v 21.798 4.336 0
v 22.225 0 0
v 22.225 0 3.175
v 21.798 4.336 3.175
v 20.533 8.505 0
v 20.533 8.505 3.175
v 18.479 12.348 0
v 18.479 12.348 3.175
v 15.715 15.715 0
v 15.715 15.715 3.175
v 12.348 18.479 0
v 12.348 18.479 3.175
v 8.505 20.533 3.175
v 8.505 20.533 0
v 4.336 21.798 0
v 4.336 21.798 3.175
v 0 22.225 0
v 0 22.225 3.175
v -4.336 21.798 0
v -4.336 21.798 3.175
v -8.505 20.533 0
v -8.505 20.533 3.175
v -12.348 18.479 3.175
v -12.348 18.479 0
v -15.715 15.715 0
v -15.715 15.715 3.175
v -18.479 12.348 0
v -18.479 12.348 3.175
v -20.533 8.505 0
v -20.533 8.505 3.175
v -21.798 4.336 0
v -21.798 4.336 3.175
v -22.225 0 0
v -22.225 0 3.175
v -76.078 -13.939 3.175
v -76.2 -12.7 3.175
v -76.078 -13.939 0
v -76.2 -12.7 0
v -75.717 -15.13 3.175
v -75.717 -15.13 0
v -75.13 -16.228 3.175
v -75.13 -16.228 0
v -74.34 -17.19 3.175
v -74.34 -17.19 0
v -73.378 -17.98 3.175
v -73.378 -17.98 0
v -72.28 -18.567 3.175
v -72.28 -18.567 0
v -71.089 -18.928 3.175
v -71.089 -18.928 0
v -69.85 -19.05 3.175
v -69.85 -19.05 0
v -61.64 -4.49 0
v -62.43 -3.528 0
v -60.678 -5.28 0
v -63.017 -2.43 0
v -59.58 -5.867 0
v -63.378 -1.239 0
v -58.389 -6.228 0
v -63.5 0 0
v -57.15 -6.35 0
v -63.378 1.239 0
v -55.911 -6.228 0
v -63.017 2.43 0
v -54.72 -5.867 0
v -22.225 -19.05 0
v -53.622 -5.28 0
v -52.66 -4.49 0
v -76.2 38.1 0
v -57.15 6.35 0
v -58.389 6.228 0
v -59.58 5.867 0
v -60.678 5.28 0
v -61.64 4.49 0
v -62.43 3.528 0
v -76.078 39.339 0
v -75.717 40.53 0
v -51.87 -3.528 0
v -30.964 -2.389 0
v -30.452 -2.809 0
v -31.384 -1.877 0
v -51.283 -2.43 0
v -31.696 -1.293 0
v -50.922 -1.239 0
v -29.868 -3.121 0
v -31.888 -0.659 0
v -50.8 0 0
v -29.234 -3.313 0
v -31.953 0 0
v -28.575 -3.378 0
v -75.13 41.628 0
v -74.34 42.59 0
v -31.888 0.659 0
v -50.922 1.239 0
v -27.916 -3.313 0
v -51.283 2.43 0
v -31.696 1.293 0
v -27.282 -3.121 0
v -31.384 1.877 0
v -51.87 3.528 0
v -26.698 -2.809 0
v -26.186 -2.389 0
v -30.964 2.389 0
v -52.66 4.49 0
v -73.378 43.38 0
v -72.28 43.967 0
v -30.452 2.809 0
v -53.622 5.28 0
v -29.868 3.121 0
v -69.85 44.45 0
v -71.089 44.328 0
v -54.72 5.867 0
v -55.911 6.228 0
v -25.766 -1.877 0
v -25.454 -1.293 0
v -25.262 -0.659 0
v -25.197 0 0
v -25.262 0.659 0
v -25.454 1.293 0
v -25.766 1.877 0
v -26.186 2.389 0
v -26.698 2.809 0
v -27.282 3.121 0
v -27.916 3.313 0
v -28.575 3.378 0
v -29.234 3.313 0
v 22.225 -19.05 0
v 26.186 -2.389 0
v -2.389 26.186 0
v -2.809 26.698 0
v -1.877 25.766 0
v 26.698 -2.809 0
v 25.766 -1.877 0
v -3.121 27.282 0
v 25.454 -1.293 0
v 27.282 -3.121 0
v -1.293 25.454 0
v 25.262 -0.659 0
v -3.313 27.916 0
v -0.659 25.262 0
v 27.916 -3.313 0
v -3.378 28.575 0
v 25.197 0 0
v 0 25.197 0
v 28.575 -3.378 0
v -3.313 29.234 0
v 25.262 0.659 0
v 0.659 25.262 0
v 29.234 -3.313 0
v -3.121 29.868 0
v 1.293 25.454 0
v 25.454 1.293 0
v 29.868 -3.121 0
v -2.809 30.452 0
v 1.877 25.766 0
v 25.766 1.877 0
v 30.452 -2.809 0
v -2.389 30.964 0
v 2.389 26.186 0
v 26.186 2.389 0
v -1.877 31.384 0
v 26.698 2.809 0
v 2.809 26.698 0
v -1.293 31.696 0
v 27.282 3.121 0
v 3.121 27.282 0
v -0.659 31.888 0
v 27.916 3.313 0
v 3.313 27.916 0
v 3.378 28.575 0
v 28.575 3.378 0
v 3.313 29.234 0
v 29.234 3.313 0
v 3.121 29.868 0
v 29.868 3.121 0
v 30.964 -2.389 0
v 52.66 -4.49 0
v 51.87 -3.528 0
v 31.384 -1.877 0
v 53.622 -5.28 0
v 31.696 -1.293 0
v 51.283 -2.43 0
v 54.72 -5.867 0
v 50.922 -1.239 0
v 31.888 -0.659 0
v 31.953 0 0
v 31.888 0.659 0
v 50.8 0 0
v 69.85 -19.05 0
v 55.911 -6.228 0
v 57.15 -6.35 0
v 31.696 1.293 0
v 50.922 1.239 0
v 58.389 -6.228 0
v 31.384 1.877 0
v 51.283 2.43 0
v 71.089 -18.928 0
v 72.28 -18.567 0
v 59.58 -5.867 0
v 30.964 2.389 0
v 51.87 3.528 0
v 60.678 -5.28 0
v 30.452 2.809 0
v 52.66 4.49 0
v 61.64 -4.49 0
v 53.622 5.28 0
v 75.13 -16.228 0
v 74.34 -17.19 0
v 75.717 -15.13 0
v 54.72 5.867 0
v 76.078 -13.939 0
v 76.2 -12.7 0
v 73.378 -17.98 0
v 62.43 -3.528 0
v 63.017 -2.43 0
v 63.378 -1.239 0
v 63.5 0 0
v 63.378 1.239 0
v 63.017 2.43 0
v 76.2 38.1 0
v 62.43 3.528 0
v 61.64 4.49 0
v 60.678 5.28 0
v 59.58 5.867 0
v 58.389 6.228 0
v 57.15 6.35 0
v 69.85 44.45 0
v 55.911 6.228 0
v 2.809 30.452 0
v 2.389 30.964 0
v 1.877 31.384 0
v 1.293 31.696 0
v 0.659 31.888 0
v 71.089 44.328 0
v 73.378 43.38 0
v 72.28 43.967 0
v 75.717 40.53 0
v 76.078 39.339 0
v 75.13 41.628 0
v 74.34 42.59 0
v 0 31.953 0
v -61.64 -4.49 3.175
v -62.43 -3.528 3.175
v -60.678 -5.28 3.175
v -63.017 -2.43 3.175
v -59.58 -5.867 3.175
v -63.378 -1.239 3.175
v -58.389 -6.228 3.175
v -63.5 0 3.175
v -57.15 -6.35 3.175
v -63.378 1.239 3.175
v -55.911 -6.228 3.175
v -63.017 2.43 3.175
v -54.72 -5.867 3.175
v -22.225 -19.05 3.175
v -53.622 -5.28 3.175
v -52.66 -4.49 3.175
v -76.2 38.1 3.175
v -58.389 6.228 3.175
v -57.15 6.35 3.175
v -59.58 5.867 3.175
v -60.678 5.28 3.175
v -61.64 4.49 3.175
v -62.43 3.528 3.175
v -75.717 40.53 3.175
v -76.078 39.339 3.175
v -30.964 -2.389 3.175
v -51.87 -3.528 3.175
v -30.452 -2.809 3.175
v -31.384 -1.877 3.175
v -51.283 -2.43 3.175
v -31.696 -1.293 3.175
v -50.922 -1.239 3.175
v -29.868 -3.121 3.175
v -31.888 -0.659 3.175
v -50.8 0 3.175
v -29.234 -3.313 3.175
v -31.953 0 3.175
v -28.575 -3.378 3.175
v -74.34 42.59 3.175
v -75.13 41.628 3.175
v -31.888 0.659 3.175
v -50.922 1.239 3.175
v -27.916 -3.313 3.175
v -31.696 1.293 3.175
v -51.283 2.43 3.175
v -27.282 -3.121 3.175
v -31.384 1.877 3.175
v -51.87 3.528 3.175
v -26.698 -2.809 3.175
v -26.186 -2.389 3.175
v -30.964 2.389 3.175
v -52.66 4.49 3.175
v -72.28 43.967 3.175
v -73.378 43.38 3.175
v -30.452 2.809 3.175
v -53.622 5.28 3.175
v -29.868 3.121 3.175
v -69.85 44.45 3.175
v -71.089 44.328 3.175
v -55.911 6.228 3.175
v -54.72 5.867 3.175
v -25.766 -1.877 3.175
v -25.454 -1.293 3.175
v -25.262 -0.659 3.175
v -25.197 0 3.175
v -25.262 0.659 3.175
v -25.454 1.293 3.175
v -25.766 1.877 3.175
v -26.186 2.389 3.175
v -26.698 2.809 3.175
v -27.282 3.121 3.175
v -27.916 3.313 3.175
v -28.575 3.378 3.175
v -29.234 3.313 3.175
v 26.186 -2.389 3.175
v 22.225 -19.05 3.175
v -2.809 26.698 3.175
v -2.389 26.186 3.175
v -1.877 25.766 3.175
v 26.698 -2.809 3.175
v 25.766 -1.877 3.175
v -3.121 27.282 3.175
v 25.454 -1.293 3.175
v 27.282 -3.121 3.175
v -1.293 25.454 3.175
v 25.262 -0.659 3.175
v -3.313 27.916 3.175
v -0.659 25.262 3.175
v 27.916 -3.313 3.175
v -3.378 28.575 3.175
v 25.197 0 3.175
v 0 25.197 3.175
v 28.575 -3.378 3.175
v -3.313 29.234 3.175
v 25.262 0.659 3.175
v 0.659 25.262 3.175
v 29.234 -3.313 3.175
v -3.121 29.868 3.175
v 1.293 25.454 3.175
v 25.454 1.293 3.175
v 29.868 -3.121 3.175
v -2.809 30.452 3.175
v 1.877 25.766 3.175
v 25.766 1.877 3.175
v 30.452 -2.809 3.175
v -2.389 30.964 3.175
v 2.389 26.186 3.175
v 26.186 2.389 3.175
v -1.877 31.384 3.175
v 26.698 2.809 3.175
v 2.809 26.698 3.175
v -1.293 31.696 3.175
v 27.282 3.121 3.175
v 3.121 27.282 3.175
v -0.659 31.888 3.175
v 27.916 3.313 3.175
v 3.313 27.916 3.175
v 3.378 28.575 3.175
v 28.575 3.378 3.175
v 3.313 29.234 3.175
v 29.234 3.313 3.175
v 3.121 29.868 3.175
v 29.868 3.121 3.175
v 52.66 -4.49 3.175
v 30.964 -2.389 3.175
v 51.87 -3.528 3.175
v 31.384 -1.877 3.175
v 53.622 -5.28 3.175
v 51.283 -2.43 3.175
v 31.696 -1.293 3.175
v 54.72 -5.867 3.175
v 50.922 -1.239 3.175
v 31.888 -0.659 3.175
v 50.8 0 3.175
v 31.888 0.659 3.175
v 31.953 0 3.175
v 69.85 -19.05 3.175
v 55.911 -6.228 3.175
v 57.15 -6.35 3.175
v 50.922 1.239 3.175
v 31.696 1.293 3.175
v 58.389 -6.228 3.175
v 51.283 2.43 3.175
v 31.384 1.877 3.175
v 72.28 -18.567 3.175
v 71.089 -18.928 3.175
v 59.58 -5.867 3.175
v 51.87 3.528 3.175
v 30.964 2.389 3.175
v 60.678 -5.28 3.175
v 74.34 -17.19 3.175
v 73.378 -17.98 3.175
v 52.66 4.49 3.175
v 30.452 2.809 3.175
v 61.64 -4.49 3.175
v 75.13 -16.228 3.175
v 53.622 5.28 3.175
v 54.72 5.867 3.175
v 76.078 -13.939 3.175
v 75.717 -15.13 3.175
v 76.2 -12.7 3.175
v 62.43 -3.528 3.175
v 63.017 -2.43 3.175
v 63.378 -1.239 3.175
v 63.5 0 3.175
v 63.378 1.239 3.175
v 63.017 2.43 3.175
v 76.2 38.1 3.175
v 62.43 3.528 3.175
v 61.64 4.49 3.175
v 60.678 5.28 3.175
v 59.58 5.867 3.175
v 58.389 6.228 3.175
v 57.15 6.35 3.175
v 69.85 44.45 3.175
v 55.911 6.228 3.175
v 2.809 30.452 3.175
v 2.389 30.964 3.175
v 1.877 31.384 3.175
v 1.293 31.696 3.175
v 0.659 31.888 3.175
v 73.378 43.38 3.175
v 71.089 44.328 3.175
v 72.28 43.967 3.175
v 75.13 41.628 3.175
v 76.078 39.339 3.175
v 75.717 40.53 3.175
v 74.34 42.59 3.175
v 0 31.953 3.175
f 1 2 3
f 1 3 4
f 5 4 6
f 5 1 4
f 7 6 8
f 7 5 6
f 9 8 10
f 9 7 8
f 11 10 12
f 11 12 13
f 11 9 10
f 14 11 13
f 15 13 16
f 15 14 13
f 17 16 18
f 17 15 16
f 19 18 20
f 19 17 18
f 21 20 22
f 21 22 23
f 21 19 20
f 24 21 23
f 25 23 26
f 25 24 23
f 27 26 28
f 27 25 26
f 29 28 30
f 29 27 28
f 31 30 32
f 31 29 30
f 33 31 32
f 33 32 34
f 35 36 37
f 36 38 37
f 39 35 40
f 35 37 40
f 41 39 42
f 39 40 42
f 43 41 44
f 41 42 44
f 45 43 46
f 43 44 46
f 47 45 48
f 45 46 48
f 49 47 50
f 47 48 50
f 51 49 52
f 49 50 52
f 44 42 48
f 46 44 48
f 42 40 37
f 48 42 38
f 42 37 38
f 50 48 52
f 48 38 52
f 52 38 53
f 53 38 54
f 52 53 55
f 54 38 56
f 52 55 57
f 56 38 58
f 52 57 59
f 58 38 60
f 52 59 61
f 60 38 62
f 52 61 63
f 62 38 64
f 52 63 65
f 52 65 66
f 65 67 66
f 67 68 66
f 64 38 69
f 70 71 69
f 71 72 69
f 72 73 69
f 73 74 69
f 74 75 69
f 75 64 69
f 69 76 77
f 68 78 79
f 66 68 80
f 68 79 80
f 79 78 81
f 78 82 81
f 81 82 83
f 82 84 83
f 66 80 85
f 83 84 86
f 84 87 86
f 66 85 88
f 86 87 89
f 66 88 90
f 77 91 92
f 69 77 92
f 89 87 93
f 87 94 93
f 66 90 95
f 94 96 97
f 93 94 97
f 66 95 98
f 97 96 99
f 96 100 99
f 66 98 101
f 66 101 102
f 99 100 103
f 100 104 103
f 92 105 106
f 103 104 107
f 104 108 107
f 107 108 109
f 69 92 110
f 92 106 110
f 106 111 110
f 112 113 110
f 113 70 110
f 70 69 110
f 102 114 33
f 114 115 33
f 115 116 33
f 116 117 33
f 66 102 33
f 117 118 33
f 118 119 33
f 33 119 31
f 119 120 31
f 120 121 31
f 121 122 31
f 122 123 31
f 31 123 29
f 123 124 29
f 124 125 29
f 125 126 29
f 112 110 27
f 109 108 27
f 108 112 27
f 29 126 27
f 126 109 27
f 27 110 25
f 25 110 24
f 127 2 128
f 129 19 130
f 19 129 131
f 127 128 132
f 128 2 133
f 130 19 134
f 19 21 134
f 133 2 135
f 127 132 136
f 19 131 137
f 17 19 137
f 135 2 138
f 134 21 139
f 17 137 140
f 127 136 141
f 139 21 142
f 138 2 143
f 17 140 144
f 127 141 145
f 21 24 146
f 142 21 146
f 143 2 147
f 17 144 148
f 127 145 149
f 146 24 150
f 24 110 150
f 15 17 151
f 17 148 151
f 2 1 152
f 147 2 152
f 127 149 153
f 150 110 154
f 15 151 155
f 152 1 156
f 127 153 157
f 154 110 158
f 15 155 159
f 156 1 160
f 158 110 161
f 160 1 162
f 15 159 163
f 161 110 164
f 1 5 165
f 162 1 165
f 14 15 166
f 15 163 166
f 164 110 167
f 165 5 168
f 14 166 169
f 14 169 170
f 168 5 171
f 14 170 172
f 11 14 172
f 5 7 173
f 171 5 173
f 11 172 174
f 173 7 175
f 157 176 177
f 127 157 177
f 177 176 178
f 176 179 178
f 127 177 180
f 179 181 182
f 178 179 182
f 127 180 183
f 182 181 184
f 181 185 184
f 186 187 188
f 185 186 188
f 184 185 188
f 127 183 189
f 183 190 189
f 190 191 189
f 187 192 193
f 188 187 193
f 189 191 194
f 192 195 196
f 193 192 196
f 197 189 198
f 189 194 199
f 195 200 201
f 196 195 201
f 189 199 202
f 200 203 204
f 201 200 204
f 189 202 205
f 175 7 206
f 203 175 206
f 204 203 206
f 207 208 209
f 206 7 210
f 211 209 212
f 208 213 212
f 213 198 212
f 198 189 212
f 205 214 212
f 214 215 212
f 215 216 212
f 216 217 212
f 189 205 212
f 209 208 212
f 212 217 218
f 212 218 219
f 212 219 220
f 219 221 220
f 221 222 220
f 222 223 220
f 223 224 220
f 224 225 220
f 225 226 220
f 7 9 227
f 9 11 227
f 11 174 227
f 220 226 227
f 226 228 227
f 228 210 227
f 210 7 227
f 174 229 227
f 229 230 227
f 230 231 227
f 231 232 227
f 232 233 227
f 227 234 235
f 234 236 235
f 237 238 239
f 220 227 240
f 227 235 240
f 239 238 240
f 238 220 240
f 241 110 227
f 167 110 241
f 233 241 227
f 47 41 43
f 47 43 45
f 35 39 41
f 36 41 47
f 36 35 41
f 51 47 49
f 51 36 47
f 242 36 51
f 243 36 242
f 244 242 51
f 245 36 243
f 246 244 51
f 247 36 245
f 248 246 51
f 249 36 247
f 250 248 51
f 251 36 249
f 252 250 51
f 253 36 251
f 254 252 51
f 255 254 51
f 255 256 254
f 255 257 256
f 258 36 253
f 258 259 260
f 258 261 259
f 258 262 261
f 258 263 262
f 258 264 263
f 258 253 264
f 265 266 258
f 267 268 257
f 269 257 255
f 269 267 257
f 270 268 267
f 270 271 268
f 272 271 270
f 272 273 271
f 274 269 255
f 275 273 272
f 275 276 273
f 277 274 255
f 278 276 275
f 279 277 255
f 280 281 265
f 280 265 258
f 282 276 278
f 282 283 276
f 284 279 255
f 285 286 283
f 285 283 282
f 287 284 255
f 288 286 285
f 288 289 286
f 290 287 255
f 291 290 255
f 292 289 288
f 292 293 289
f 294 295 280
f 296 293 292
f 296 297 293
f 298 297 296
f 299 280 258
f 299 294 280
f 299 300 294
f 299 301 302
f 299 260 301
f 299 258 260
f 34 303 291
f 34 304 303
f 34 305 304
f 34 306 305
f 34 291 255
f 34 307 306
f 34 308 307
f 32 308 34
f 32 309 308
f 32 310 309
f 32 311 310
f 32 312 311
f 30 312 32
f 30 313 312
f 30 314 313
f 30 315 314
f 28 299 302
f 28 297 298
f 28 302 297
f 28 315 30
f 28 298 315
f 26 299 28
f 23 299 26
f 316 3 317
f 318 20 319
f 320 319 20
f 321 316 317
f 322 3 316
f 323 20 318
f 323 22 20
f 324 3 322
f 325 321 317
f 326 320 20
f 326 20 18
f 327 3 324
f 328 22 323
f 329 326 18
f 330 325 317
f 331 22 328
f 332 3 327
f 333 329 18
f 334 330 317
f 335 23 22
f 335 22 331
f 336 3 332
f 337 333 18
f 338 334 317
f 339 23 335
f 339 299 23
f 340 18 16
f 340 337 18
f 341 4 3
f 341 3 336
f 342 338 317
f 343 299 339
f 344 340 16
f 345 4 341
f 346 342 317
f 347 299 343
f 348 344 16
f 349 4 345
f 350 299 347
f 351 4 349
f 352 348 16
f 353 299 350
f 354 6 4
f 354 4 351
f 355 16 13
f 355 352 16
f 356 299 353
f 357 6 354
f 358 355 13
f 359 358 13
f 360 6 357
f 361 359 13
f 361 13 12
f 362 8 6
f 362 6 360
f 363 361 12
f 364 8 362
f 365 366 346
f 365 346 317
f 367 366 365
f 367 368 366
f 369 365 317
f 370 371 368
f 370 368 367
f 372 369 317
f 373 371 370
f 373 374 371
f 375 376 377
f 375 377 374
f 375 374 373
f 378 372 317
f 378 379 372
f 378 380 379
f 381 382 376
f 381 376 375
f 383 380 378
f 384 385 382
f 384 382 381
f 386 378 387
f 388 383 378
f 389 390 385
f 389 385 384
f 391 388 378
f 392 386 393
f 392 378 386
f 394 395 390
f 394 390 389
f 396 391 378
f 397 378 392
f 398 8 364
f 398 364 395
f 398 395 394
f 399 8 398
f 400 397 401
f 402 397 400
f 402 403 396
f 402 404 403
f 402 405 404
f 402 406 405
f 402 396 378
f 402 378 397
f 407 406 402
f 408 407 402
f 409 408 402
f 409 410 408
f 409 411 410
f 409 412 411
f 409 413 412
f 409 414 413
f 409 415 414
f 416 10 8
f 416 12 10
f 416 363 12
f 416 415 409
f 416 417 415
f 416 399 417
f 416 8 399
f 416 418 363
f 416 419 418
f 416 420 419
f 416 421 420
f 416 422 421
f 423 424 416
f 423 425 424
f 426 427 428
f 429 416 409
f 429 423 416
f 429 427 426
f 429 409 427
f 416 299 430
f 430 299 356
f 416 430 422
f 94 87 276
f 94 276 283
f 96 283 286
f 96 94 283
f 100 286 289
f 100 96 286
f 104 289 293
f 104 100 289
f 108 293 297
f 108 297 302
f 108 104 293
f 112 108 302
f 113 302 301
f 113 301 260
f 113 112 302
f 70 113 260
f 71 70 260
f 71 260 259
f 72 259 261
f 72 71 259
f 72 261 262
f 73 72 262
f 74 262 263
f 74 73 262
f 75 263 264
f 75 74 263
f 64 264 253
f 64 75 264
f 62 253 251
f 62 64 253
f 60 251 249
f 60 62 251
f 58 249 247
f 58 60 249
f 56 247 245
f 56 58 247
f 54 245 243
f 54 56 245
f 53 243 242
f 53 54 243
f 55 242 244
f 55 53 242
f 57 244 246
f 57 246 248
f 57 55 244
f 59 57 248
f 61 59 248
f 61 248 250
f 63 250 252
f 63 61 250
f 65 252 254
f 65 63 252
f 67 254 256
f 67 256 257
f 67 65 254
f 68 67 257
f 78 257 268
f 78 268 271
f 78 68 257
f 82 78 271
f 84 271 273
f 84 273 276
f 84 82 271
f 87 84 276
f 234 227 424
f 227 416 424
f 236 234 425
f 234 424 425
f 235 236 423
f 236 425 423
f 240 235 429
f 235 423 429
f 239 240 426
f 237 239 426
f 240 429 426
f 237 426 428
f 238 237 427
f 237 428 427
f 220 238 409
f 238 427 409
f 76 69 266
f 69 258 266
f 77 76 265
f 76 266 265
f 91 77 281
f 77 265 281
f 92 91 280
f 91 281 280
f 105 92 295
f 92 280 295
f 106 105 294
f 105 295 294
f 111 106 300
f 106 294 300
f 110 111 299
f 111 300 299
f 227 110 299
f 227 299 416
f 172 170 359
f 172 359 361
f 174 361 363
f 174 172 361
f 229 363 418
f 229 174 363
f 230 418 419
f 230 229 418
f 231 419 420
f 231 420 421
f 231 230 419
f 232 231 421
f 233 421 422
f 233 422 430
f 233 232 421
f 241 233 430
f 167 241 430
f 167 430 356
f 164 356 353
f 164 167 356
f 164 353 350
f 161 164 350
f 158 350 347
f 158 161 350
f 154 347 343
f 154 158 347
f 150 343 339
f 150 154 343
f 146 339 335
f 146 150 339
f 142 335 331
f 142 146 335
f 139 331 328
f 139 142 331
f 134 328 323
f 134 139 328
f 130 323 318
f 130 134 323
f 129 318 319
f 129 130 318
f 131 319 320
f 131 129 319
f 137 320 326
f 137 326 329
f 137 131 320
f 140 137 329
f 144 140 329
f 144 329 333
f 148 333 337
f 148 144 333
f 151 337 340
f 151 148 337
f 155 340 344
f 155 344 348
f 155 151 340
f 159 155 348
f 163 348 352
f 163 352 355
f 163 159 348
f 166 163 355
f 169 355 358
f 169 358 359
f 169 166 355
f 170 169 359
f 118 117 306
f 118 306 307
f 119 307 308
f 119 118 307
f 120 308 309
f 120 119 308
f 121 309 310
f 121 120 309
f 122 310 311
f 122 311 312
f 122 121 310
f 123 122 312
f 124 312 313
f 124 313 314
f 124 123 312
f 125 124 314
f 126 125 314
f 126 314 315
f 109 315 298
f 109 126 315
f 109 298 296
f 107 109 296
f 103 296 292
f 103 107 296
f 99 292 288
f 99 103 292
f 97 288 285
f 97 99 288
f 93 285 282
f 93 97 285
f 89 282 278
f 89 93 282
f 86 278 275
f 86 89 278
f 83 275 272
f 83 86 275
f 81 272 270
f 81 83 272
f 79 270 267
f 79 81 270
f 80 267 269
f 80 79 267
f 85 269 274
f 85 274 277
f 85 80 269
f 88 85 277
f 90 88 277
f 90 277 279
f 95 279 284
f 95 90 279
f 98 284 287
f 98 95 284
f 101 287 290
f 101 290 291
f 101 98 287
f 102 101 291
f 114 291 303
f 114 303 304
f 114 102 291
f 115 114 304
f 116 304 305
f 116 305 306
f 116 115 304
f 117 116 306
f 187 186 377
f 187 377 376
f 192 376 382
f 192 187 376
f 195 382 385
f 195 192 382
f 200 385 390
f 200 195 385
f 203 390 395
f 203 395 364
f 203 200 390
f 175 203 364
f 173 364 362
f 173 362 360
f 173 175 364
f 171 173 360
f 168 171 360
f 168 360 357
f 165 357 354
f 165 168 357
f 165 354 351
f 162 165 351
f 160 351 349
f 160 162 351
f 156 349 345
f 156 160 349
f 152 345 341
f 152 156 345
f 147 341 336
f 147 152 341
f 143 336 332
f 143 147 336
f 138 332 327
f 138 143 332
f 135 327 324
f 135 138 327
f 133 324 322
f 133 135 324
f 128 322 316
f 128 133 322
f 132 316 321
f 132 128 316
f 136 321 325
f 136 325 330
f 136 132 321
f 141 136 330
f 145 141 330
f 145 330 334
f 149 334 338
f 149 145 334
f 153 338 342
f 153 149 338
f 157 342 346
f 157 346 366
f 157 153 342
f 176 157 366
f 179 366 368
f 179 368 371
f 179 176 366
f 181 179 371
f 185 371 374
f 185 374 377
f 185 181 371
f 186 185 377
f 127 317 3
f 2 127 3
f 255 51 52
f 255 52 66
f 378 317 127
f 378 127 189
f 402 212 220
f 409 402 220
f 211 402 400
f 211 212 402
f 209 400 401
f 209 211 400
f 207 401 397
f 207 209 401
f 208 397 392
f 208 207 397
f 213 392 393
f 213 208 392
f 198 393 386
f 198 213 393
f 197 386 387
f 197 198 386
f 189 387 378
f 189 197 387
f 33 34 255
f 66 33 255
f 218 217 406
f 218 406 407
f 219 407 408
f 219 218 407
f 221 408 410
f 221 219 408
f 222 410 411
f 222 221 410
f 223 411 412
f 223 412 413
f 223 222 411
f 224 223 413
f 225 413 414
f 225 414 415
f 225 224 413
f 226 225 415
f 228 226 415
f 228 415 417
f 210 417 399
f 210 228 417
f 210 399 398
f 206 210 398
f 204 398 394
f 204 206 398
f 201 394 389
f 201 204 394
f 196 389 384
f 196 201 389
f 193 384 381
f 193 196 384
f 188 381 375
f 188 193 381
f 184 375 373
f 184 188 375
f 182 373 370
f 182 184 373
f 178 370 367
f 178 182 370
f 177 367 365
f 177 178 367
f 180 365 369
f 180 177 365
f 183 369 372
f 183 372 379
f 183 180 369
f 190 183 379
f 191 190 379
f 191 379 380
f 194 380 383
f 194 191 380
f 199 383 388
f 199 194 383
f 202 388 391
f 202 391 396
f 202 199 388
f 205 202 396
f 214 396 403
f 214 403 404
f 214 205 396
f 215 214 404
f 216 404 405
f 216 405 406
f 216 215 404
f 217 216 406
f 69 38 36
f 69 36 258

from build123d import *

# Parameters (mm, degrees)
SKETCH1_W           = 152.4
SKETCH1_H           = 88.9
SKETCH1_R           = 3.3782
SKETCH1_R_2         = 6.35
SKETCH1_R_3         = 22.225
BOSS_EXTRUDE1_DEPTH = 3.175
SKETCH2_R           = 3.3782
CUT_EXTRUDE1_DEPTH  = 4.175
SKETCH3_W           = 152.4
SKETCH3_H           = 25.4
CUT_EXTRUDE2_DEPTH  = 4.175
FILLET1_R           = 6.35


with BuildPart() as part:
    # Sketch1 → Boss-Extrude1 (new body)
    with BuildSketch(Plane.XY):
        Rectangle(SKETCH1_W, SKETCH1_H)
        with Locations((-28.575, 0)):
            Circle(SKETCH1_R, mode=Mode.SUBTRACT)
        with Locations((0, 28.575)):
            Circle(SKETCH1_R, mode=Mode.SUBTRACT)
        with Locations((28.575, 0)):
            Circle(SKETCH1_R, mode=Mode.SUBTRACT)
        with Locations((0, -28.575)):
            Circle(SKETCH1_R, mode=Mode.SUBTRACT)
        with Locations((-57.15, 0)):
            Circle(SKETCH1_R_2, mode=Mode.SUBTRACT)
        with Locations((57.15, 0)):
            Circle(SKETCH1_R_2, mode=Mode.SUBTRACT)
        Circle(SKETCH1_R_3, mode=Mode.SUBTRACT)
    extrude(amount=BOSS_EXTRUDE1_DEPTH)

    # Sketch2 → Cut-Extrude1 (cut, through all)
    with BuildSketch(Plane.XY.offset(3.175)):
        with BuildLine():
            Line((-28.575, -20.32), (-28.575, -44.45))
            Line((-28.575, -44.45), (28.575, -44.45))
            Line((28.575, -44.45), (28.575, -20.32))
            Line((28.575, -20.32), (22.225, -20.32))
            Line((22.225, -20.32), (9.002678768, -20.32))
            ThreePointArc((9.002678768, -20.32), (0, -22.225), (-9.002678768, -20.32))
            Line((-9.002678768, -20.32), (-22.225, -20.32))
            Line((-22.225, -20.32), (-28.575, -20.32))
        make_face()
        with Locations((0, -28.575)):
            Circle(SKETCH2_R, mode=Mode.SUBTRACT)
        with BuildLine():
            Line((-22.225, 0), (-22.225, -20.32))
            Line((-22.225, -20.32), (-9.002678768, -20.32))
            ThreePointArc((-9.002678768, -20.32), (-18.628407884, -12.121594148), (-22.225, 0))
        make_face()
        with BuildLine():
            Line((9.002678768, -20.32), (22.225, -20.32))
            Line((22.225, -20.32), (22.225, 0))
            ThreePointArc((22.225, 0), (18.628407884, -12.121594148), (9.002678768, -20.32))
        make_face()
        with BuildLine():
            ThreePointArc((-22.225, 0), (-18.628407884, -12.121594148), (-9.002678768, -20.32))
            Line((-9.002678768, -20.32), (9.002678768, -20.32))
            ThreePointArc((9.002678768, -20.32), (18.628407884, -12.121594148), (22.225, 0))
            Line((22.225, 0), (-22.225, 0))
        make_face()
        with BuildLine():
            Line((9.002678768, -20.32), (-9.002678768, -20.32))
            ThreePointArc((-9.002678768, -20.32), (0, -22.225), (9.002678768, -20.32))
        make_face()
    extrude(amount=-CUT_EXTRUDE1_DEPTH, mode=Mode.SUBTRACT)

    # Sketch3 → Cut-Extrude2 (cut, through all)
    with BuildSketch(Plane.XY.offset(3.175)):
        with Locations((0, -31.75)):
            Rectangle(SKETCH3_W, SKETCH3_H)
    extrude(amount=-CUT_EXTRUDE2_DEPTH, mode=Mode.SUBTRACT)

    # Fillet1
    fillet1_edges = [part.edges().sort_by_distance(p)[0] for p in [
        (-76.2, 44.45, 1.5875),
        (76.2, 44.45, 1.5875),
        (-76.2, -19.05, 1.5875),
        (76.2, -19.05, 1.5875),
    ]]
    fillet(fillet1_edges, radius=FILLET1_R)


solid = part.part
